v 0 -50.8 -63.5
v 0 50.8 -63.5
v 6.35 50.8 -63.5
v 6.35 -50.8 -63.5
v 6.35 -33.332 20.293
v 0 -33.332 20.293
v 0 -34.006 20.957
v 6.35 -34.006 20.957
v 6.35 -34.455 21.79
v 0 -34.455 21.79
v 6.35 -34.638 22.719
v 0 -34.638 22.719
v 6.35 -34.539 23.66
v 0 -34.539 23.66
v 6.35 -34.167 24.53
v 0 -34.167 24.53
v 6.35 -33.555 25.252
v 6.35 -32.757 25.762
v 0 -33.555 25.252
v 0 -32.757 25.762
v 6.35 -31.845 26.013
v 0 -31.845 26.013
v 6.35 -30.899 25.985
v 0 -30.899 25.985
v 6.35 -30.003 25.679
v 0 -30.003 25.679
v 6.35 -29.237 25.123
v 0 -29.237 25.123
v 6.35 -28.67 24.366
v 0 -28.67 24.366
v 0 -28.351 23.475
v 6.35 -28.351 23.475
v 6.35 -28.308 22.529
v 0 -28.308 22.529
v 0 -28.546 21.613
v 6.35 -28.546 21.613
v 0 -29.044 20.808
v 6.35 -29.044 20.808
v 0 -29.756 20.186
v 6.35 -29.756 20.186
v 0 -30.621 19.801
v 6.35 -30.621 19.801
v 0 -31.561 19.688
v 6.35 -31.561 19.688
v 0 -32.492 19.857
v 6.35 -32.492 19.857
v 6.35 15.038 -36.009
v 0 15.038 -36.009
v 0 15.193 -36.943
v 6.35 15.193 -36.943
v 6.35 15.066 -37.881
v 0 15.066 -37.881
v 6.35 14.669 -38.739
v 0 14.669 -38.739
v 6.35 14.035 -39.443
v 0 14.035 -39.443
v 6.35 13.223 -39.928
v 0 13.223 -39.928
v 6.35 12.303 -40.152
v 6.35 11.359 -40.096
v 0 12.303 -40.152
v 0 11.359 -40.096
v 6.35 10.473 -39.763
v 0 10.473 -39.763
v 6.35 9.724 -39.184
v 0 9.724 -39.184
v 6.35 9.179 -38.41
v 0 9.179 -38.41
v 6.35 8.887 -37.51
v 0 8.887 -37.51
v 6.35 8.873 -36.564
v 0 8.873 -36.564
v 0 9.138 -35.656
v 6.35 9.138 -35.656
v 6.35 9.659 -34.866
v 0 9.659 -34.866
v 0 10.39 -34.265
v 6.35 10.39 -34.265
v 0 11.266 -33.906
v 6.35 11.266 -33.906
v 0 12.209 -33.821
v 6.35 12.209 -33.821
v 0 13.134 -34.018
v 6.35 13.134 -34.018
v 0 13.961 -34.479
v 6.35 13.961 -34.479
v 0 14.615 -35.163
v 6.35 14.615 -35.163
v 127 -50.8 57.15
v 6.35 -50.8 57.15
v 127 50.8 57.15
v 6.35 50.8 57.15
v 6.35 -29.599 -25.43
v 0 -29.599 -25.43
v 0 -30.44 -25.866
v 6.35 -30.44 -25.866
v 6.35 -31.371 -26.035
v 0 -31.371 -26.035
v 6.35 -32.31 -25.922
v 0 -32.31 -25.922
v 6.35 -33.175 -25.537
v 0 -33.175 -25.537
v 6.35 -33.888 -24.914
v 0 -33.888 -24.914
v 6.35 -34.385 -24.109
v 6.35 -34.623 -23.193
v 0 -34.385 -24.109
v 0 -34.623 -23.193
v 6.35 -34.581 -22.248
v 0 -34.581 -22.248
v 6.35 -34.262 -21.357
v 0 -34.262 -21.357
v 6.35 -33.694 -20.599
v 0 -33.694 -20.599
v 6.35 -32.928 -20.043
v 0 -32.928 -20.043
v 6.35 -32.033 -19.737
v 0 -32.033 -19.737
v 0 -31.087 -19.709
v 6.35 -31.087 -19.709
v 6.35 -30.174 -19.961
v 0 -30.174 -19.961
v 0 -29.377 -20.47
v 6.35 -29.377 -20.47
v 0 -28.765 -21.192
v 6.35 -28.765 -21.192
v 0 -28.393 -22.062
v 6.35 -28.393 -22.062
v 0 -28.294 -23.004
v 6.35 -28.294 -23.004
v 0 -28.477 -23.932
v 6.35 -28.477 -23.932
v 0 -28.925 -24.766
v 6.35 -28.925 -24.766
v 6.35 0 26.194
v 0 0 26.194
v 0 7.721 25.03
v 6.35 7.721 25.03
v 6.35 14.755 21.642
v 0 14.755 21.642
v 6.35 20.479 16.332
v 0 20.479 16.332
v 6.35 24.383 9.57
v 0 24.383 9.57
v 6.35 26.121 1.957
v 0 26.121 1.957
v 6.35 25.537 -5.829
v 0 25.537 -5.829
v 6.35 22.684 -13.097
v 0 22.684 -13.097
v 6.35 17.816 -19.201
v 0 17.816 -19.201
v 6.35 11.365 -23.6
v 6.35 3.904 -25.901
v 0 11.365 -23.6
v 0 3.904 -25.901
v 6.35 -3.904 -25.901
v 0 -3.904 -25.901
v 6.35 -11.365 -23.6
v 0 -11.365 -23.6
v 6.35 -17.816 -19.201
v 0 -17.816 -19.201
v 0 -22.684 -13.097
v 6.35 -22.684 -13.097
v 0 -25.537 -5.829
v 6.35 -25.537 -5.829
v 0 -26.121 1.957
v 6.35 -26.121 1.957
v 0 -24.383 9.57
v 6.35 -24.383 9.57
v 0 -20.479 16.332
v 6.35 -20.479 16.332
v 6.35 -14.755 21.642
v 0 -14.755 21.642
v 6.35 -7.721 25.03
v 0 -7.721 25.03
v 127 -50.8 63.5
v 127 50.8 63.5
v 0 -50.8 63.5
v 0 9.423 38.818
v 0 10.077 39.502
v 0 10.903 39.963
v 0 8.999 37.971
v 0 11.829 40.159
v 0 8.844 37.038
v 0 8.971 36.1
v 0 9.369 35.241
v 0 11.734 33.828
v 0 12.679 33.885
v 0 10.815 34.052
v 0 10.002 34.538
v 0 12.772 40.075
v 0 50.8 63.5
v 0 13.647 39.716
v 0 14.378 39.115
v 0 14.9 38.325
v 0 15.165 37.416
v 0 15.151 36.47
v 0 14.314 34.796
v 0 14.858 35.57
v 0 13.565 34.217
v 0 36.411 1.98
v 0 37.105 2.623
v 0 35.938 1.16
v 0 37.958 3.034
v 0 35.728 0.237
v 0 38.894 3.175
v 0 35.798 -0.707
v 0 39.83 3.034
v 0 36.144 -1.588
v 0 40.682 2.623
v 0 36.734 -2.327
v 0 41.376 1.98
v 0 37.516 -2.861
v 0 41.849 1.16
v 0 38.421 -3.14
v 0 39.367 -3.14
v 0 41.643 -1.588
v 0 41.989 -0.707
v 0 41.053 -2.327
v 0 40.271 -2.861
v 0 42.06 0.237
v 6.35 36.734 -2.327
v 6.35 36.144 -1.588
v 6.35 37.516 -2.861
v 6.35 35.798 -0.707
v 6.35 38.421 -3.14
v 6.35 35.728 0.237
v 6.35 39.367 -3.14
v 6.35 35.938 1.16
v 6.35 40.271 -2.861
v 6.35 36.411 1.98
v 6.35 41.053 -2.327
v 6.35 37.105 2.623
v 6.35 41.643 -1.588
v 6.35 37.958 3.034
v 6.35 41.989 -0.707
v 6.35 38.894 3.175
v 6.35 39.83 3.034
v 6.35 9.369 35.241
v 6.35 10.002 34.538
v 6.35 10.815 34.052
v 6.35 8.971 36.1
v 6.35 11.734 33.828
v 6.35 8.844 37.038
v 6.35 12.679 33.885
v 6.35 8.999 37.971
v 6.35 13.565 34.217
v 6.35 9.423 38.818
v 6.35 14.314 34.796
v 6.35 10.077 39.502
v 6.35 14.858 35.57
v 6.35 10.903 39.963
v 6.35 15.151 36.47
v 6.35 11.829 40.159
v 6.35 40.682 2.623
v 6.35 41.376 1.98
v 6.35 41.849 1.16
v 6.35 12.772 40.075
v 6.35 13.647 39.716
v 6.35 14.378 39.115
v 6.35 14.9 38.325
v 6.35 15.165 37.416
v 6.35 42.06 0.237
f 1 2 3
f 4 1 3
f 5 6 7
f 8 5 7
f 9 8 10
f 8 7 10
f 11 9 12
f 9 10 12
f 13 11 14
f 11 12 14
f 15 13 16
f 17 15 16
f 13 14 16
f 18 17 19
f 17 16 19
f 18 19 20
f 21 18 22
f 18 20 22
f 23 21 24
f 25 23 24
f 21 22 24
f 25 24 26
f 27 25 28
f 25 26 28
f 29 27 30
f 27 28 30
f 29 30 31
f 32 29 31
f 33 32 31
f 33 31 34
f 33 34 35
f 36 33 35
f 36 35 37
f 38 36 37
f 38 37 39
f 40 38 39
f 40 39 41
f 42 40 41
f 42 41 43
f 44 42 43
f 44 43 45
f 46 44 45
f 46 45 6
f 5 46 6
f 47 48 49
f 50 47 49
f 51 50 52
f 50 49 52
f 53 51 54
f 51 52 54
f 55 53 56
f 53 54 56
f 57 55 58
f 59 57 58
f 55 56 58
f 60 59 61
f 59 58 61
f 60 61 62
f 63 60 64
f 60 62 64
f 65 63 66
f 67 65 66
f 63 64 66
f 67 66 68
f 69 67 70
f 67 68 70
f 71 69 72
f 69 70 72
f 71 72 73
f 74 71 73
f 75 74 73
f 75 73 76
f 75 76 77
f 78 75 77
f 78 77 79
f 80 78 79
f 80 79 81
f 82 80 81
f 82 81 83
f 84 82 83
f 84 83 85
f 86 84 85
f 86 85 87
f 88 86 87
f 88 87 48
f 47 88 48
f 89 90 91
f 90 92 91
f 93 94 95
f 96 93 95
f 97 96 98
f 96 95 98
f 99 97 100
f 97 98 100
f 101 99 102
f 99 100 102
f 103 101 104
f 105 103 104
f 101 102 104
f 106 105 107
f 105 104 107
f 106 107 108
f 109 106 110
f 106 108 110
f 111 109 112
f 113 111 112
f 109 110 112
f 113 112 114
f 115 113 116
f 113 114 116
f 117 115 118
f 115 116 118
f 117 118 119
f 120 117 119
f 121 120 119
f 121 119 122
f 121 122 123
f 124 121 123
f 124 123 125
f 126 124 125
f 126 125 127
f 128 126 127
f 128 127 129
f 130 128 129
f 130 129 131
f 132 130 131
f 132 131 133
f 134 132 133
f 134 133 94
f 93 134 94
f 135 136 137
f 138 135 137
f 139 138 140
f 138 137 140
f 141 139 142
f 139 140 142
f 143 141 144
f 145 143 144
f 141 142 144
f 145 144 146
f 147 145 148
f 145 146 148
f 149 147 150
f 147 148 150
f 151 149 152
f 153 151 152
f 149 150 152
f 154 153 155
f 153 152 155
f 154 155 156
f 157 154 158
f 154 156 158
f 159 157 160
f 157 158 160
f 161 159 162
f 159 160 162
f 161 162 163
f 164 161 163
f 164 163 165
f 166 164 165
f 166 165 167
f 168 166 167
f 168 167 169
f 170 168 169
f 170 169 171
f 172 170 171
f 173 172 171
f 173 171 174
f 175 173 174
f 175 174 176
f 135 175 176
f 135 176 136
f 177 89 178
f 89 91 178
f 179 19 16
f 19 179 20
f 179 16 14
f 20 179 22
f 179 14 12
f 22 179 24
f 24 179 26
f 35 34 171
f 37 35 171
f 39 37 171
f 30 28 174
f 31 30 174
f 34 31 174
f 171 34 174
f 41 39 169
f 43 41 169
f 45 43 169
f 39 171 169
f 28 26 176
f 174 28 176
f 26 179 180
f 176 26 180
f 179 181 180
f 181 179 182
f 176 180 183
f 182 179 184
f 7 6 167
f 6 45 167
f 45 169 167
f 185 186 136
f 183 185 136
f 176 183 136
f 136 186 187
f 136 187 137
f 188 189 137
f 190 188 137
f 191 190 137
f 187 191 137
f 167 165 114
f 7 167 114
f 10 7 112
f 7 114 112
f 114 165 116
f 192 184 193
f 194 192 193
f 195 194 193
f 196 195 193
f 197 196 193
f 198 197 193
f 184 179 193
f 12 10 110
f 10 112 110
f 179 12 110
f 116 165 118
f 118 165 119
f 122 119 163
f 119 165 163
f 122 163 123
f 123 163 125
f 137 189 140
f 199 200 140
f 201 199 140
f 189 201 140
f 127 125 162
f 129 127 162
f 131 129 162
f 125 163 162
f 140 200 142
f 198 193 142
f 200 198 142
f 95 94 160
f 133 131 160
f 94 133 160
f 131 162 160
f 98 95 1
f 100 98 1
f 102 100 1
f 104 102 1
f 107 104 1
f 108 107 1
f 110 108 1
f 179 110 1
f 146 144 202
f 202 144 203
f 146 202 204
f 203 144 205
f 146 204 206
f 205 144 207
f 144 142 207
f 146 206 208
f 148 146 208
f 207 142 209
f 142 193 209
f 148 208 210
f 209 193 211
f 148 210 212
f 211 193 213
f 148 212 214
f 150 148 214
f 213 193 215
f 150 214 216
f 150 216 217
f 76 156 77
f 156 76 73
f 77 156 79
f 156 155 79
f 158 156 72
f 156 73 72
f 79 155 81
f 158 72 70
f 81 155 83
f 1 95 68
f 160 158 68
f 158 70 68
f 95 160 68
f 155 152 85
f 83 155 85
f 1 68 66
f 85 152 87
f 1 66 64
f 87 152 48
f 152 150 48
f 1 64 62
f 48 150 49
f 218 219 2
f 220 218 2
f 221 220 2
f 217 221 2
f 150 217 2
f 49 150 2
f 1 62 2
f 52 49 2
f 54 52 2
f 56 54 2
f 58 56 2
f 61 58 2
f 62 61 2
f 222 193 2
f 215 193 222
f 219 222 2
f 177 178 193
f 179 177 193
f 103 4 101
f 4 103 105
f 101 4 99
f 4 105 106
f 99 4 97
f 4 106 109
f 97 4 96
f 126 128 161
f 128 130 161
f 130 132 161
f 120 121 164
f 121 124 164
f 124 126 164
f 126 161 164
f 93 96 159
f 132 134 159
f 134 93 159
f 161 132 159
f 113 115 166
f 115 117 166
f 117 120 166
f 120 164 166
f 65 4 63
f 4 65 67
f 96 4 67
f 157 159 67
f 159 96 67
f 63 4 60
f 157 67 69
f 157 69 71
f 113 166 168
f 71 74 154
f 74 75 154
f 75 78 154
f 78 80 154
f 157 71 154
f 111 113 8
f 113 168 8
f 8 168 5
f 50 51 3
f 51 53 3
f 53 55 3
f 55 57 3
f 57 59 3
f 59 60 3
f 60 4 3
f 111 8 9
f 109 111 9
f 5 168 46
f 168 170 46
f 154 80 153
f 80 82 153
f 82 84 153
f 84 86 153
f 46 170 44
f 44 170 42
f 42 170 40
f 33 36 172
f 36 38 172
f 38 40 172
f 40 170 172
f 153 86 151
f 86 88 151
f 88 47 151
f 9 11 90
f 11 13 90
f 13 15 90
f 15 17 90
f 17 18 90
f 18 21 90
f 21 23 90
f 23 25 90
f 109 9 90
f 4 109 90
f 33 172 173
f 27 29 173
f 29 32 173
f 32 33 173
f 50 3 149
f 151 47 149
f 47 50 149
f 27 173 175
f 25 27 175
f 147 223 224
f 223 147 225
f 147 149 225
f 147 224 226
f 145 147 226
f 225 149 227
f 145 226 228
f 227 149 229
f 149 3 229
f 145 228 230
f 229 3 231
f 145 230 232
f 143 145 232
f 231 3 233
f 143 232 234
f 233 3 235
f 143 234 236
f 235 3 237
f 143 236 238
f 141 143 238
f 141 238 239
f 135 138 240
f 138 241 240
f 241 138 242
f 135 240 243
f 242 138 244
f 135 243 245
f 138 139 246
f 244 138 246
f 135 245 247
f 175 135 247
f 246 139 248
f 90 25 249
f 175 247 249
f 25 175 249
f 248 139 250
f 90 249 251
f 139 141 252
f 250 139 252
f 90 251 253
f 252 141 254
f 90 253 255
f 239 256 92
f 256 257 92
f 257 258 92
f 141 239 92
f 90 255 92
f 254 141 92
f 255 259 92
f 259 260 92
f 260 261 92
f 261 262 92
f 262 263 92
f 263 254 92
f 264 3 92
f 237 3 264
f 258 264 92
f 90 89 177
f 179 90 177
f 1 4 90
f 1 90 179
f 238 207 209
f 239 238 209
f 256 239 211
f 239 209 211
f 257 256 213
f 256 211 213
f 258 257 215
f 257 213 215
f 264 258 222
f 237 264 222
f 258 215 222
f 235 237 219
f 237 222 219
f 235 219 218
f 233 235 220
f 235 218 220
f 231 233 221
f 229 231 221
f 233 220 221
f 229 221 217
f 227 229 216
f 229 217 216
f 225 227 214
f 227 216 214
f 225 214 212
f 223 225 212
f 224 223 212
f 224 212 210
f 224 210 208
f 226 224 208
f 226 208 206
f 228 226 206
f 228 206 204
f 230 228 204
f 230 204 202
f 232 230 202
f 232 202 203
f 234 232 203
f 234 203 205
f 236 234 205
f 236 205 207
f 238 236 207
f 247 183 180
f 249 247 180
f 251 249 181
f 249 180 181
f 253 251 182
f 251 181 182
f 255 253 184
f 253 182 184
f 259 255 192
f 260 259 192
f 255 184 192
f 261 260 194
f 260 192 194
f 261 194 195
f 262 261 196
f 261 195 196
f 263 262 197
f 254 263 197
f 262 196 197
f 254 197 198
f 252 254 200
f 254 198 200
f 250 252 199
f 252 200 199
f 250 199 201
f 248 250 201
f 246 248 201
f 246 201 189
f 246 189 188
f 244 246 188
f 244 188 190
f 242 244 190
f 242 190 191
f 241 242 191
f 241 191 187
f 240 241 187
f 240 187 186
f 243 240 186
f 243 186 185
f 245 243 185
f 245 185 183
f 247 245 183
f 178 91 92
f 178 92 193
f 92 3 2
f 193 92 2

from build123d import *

# Parameters (mm, degrees)
BOSS_EXTRUDE1_DEPTH = 50.8
SKETCH2_R           = 26.19375
CUT_EXTRUDE1_DEPTH  = 128
SKETCH3_R           = 3.175
CUT_EXTRUDE2_DEPTH  = 128
CIRPATTERN1_COUNT   = 5


with BuildPart() as part:
    # Sketch1 → Boss-Extrude1 (new body, symmetric)
    with BuildSketch(Plane(origin=(0, 0, 0), x_dir=(1, 0, 0), z_dir=(0, 1, 0))):
        Polygon((0, 63.5), (6.35, 63.5), (6.35, -57.15), (127, -57.15), (127, -63.5), (0, -63.5), align=None)
    extrude(amount=BOSS_EXTRUDE1_DEPTH, both=True)

    # Sketch2 → Cut-Extrude1 (cut, through all)
    with BuildSketch(Plane.ZY):
        Circle(SKETCH2_R)
    extrude(amount=-CUT_EXTRUDE1_DEPTH, mode=Mode.SUBTRACT)

    # Sketch3 → Cut-Extrude2 (cut, through all)
    with BuildSketch(Plane.ZY):
        with Locations((0, 38.89375)):
            Circle(SKETCH3_R)
    cut_extrude2 = extrude(amount=-CUT_EXTRUDE2_DEPTH, mode=Mode.SUBTRACT)

    # CirPattern1: Cut-Extrude2 ×5 about axis
    cirpattern1_axis = Axis((0, 0, 0), (1, 0, 0))
    for i in range(1, CIRPATTERN1_COUNT):
        add(cut_extrude2.rotate(cirpattern1_axis, i * 360 / CIRPATTERN1_COUNT), mode=Mode.SUBTRACT)


solid = part.part
